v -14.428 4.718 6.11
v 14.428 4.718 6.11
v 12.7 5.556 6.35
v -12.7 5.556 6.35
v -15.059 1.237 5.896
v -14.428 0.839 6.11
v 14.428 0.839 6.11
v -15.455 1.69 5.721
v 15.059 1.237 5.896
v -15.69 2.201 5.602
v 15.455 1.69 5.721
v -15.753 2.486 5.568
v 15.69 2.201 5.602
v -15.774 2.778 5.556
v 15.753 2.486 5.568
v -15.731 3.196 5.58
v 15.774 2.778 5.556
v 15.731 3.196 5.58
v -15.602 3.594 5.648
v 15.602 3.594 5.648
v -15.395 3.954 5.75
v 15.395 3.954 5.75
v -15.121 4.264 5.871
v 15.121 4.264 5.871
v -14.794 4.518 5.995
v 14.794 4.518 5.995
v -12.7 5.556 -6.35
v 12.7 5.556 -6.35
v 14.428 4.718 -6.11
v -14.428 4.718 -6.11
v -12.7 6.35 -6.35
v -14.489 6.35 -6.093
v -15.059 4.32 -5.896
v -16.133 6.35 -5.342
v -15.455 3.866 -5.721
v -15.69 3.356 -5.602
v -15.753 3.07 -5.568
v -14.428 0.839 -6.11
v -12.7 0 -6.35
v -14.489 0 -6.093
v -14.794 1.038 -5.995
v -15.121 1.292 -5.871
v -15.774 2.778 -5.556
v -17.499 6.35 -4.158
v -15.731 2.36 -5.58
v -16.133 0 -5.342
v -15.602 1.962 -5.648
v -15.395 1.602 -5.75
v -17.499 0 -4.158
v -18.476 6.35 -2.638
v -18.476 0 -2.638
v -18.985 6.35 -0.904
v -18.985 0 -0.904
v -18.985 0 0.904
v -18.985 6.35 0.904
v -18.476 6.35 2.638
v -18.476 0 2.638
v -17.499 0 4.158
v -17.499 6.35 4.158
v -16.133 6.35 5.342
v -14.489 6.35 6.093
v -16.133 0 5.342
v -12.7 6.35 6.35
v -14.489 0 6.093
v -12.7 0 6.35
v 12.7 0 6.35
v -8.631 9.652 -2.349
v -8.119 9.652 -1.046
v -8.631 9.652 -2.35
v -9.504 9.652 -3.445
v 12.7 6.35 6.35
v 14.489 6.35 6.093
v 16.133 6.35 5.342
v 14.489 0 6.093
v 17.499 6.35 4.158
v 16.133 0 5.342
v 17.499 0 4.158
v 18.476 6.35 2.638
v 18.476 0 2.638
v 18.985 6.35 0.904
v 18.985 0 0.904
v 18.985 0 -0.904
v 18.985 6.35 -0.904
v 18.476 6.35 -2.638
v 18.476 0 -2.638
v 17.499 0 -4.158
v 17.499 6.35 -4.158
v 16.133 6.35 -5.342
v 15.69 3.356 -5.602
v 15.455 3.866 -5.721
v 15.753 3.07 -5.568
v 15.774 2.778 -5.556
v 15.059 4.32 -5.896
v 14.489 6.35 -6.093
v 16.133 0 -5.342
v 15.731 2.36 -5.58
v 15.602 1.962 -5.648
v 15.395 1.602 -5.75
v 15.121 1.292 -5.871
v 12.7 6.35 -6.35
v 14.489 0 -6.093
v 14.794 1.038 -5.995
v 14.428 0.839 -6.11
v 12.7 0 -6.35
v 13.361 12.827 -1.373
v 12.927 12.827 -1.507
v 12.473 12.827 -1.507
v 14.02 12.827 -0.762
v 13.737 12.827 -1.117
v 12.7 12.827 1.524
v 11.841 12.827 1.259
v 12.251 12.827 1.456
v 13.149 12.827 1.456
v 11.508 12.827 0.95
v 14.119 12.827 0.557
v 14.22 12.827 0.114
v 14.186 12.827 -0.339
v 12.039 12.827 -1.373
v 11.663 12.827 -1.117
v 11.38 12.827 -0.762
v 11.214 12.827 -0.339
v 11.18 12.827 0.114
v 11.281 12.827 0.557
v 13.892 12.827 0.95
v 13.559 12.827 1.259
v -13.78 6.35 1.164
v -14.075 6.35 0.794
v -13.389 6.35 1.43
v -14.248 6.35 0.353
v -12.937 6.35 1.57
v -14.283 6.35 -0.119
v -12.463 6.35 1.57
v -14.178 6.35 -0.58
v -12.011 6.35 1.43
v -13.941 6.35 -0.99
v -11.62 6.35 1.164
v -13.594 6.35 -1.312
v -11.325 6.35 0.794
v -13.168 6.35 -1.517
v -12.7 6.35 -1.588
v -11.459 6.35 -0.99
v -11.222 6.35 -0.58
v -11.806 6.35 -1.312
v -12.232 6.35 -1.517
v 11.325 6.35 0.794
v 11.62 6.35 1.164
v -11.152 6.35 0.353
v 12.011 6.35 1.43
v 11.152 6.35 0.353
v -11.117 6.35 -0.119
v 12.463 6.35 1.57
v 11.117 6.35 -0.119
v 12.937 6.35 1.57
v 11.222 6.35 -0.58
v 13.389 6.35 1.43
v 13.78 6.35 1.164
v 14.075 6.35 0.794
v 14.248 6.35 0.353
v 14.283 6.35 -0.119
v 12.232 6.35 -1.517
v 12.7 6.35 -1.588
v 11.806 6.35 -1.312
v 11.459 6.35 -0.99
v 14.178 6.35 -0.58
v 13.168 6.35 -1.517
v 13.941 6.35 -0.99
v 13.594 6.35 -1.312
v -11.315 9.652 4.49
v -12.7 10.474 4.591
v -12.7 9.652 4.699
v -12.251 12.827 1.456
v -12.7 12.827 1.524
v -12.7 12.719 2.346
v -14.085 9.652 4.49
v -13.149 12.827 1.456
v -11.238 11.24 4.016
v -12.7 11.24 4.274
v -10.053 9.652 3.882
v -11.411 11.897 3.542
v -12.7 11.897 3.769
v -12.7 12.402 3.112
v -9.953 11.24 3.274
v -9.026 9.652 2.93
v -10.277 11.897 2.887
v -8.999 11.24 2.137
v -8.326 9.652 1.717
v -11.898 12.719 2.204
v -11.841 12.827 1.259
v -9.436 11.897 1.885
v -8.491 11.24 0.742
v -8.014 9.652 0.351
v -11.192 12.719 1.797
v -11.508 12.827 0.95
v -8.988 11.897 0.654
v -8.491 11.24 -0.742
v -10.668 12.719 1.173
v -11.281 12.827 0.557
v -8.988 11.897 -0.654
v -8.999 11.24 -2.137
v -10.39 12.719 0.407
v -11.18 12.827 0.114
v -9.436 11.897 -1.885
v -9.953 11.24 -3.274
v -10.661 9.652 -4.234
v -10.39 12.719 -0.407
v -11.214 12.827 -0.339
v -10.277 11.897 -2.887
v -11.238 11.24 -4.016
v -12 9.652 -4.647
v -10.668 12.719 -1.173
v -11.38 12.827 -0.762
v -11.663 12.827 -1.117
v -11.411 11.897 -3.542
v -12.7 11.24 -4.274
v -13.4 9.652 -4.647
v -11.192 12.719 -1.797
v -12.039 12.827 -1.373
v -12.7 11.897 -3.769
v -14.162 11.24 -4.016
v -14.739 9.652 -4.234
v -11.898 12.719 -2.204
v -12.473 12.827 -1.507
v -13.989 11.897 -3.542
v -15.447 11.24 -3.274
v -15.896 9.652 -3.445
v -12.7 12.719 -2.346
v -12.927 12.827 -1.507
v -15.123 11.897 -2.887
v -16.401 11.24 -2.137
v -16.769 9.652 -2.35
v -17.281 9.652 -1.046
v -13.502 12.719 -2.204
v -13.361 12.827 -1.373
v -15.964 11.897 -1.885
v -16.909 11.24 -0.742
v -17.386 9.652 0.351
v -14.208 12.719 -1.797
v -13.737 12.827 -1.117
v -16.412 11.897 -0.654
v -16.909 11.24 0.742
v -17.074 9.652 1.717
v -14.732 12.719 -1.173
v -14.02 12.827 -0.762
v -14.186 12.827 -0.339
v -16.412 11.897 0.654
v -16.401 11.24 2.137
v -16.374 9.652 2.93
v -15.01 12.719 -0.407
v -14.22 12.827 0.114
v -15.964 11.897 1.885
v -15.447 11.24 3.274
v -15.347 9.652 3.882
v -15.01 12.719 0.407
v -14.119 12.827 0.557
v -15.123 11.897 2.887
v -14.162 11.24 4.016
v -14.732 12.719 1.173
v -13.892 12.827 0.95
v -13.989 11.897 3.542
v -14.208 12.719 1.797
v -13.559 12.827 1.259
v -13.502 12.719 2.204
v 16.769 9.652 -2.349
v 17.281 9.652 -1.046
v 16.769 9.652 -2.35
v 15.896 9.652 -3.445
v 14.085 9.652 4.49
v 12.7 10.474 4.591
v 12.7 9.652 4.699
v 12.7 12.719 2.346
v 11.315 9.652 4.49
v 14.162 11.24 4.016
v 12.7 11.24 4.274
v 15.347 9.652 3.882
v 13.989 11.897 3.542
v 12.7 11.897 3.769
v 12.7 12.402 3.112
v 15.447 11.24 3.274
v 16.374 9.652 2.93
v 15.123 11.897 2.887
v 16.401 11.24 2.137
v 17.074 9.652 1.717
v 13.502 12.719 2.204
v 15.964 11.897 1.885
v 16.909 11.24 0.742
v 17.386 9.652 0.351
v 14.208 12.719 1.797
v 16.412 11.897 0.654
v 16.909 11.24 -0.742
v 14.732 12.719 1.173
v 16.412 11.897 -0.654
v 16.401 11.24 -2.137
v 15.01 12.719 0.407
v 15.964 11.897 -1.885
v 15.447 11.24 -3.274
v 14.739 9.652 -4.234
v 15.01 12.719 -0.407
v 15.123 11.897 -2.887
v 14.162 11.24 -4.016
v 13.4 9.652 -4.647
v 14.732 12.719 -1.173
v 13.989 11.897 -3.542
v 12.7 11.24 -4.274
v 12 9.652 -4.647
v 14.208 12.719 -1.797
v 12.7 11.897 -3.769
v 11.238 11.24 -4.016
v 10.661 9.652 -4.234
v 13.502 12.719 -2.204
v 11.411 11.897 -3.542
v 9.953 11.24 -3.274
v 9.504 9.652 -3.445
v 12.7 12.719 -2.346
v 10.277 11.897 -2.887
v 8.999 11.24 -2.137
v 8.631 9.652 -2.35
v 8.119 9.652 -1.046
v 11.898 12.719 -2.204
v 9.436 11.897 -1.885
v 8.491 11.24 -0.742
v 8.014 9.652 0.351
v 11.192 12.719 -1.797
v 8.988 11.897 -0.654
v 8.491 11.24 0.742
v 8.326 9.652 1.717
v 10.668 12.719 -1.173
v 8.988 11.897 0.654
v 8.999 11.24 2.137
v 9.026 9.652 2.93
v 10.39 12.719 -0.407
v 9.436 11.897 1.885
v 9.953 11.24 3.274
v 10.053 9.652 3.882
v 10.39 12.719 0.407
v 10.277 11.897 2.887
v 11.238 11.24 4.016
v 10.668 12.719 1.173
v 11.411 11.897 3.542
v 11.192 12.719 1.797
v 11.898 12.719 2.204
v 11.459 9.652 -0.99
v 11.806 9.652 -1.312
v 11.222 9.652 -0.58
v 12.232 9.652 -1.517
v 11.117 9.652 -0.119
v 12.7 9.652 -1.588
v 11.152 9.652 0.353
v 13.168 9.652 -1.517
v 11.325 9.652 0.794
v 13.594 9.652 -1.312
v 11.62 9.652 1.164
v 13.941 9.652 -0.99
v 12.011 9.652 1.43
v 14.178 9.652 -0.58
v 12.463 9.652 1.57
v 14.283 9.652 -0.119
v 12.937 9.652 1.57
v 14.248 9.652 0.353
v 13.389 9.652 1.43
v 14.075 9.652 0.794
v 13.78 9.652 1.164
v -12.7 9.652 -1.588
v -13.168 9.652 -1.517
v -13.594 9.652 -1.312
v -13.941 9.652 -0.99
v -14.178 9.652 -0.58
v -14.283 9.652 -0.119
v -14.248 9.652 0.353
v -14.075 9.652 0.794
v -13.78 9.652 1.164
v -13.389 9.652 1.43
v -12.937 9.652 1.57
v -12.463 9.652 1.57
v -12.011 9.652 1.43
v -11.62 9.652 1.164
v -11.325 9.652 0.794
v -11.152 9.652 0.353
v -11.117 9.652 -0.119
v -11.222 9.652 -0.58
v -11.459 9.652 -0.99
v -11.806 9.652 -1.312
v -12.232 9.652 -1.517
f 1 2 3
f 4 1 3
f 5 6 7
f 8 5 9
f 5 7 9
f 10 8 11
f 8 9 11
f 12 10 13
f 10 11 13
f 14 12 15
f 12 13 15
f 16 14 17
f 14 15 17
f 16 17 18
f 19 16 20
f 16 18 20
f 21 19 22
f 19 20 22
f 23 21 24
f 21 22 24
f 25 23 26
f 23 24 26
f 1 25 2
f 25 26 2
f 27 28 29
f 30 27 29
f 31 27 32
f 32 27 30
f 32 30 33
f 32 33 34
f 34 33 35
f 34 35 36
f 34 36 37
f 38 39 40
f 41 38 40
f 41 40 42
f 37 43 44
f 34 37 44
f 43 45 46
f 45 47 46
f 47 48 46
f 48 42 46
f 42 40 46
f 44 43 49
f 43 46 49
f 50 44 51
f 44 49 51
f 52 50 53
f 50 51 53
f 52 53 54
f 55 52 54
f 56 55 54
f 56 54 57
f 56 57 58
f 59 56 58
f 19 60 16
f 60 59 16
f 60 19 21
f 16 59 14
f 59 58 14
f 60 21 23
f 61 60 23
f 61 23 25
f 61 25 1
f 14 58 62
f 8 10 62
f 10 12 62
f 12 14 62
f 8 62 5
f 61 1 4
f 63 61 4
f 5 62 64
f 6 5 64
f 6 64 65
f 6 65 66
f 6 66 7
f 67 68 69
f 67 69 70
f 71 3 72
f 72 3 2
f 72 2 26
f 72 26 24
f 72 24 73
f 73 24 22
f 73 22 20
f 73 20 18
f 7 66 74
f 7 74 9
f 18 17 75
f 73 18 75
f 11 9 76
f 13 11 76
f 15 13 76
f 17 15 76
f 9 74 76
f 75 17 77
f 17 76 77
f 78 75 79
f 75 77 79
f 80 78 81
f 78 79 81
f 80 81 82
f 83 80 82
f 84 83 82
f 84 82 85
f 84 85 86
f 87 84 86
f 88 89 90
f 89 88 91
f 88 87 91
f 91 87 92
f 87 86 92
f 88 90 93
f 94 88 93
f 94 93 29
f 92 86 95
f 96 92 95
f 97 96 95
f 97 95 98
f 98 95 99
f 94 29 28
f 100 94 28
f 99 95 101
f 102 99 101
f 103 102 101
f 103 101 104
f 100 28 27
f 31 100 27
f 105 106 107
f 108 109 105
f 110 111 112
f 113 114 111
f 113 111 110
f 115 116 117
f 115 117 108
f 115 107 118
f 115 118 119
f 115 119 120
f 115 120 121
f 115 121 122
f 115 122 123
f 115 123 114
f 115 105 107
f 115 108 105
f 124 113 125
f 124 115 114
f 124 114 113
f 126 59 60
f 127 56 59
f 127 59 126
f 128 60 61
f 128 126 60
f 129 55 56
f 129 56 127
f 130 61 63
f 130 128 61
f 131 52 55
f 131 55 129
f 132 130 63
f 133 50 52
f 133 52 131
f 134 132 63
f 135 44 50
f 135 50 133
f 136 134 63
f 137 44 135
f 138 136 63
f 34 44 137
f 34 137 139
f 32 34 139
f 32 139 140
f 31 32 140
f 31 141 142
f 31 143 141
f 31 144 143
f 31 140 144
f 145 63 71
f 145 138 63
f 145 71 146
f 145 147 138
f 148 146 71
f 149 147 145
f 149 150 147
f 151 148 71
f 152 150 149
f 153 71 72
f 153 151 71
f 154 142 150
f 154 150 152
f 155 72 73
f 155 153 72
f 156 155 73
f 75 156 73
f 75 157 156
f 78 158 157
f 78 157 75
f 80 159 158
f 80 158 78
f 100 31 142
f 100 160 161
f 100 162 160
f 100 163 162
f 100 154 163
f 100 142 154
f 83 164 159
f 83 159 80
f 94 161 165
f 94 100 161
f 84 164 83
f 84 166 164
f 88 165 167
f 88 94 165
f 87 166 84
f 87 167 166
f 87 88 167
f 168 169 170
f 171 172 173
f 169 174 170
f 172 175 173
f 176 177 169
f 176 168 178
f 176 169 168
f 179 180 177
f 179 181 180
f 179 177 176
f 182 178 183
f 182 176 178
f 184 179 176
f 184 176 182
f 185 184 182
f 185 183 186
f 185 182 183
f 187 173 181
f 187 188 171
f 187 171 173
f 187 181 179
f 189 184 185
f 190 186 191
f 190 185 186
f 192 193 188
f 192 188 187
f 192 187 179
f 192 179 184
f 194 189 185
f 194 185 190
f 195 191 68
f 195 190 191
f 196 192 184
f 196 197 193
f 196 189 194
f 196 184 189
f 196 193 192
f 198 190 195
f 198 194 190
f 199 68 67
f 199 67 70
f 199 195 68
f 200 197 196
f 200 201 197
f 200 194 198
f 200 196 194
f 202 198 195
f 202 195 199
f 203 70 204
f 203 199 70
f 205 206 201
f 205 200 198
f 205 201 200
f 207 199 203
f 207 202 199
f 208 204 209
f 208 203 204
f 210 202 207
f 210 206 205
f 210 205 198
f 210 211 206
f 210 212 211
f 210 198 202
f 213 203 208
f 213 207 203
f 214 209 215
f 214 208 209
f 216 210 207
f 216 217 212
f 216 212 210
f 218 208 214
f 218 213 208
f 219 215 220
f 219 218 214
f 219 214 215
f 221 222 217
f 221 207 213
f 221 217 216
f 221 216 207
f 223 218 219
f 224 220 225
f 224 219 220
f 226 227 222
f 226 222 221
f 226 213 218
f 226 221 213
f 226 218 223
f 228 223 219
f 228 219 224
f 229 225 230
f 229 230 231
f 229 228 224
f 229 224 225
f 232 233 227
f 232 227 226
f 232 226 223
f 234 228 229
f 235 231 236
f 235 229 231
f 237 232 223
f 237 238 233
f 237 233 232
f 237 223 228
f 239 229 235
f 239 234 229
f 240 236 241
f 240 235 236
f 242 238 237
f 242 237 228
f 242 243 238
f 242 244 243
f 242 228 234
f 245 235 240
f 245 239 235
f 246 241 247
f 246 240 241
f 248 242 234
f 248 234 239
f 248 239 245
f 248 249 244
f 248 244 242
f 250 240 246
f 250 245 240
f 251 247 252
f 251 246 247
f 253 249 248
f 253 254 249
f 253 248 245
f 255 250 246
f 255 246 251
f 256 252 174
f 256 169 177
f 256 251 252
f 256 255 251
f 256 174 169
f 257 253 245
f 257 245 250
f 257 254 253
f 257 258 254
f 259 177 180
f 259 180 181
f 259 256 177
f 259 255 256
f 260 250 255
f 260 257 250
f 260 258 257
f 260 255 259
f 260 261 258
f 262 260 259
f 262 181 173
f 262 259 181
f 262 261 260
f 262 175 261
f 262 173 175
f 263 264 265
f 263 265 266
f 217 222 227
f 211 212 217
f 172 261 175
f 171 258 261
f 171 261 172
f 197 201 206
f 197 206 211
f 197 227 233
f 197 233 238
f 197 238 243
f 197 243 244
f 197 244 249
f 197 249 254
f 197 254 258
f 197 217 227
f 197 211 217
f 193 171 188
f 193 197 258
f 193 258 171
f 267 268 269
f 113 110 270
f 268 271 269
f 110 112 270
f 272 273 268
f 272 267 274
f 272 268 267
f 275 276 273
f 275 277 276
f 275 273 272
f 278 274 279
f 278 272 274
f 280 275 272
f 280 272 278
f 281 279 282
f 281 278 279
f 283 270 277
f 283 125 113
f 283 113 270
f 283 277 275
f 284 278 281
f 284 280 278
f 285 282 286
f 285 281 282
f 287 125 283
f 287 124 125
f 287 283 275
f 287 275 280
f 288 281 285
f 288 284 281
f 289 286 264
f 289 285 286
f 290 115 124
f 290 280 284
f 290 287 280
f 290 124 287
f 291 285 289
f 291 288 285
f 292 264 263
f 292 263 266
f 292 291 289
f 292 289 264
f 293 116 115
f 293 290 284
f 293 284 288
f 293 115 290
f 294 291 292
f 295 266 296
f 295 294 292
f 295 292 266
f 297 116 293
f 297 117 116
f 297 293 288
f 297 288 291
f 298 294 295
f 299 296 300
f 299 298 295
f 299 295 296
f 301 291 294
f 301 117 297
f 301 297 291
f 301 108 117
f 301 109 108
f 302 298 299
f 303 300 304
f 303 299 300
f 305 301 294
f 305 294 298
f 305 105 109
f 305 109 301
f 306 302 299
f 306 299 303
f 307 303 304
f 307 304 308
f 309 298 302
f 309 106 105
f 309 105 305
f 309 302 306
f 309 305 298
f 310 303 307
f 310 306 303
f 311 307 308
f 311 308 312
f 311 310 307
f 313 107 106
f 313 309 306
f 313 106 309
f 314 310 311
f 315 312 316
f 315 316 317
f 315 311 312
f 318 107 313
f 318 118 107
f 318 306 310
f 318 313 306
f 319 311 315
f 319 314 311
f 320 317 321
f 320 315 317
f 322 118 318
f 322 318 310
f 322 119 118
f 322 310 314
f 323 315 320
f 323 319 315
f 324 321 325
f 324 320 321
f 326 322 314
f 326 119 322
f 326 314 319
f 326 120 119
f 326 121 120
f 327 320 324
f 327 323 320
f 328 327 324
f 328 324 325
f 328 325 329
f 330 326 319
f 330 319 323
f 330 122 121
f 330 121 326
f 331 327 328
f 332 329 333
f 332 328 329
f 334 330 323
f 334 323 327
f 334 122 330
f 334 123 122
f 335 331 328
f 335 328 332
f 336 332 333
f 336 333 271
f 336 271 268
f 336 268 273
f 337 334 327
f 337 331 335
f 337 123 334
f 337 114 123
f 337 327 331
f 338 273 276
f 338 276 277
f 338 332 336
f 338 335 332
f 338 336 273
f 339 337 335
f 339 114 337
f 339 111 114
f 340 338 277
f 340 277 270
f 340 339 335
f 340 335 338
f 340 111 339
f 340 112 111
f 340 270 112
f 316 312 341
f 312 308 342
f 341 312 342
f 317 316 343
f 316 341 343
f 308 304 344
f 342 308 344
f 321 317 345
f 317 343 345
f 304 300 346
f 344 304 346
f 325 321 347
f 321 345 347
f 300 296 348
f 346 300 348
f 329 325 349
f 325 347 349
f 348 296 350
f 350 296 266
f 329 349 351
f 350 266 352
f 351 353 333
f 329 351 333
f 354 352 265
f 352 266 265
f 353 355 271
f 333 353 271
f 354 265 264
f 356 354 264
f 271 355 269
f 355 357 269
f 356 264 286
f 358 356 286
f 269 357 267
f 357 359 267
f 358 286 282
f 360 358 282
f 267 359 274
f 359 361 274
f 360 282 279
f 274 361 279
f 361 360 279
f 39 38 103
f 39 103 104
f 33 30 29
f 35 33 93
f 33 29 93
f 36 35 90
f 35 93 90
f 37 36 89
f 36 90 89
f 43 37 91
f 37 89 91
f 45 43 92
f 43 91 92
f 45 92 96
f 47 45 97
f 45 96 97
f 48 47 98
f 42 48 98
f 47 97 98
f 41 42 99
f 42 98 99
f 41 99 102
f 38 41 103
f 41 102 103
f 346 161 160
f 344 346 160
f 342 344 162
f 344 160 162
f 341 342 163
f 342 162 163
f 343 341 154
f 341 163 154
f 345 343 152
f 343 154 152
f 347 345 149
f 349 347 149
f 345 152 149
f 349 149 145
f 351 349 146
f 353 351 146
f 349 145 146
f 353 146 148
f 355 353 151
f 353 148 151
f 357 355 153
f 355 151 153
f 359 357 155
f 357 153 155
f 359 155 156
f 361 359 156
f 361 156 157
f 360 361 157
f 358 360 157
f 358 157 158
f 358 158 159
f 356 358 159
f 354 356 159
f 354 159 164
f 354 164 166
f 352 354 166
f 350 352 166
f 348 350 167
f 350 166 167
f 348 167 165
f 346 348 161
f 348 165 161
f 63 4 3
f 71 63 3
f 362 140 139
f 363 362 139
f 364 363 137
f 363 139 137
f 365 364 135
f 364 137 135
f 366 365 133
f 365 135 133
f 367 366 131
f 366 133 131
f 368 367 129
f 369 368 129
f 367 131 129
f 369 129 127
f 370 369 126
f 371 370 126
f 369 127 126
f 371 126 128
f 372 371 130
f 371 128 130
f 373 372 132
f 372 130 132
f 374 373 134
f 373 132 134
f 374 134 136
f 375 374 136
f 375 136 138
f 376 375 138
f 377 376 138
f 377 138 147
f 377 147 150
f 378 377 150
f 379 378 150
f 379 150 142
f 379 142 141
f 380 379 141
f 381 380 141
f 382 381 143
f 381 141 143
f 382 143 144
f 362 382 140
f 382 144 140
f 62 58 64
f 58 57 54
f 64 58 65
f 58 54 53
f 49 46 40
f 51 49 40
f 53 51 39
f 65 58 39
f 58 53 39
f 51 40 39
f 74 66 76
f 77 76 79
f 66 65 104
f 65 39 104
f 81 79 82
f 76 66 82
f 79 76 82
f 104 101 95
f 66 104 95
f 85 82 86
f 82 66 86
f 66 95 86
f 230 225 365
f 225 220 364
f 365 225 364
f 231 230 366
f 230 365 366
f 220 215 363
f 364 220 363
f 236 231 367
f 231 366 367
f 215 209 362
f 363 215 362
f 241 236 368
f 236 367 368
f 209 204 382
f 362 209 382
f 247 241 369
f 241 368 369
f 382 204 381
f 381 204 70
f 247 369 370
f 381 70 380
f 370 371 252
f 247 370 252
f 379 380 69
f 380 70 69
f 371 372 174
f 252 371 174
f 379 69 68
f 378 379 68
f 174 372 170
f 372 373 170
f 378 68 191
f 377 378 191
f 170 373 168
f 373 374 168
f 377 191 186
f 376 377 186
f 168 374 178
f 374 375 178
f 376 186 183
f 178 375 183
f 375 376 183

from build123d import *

# Parameters (mm, degrees)
SKETCH1_R           = 1.5875
BOSS_EXTRUDE1_DEPTH = 6.35
BOSS_EXTRUDE2_START = 6.35
SKETCH1_4_R         = 1.5875
BOSS_EXTRUDE2_DEPTH = 3.302
SKETCH2_R           = 4.699
BOSS_EXTRUDE3_DEPTH = 3.175
CUT_EXTRUDE1_DEPTH  = 20.32
FILLET1_R           = 3.175


with BuildPart() as part:
    # Sketch1 → Boss-Extrude1 (new body)
    # profile 1 of 3: a face of its own
    with BuildSketch(Plane(origin=(0, 0, 0), x_dir=(1, 0, 0), z_dir=(0, 1, 0))):
        with BuildLine():
            Line((-12.7, -6.35), (12.7, -6.35))
            ThreePointArc((12.7, -6.35), (19.05, 0), (12.7, 6.35))
            Line((12.7, 6.35), (-12.7, 6.35))
            ThreePointArc((-12.7, 6.35), (-19.05, 0), (-12.7, -6.35))
        make_face()
        with Locations((-12.7, 0)):
            Circle(SKETCH1_R, mode=Mode.SUBTRACT)
        with Locations((12.7, 0)):
            Circle(SKETCH1_R, mode=Mode.SUBTRACT)
    # profile 2 of 3: a face of its own
    with BuildSketch(Plane(origin=(0, 0, 0), x_dir=(1, 0, 0), z_dir=(0, 1, 0))):
        with Locations((-12.7, 0)):
            Circle(SKETCH1_R)
    # profile 3 of 3: a face of its own
    with BuildSketch(Plane(origin=(0, 0, 0), x_dir=(1, 0, 0), z_dir=(0, 1, 0))):
        with Locations((12.7, 0)):
            Circle(SKETCH1_R)
    extrude(amount=BOSS_EXTRUDE1_DEPTH)

    # Sketch1<4> → Boss-Extrude2 (add)
    with BuildSketch(Plane(origin=(0, 0, 0), x_dir=(1, 0, 0), z_dir=(0, 1, 0)).offset(BOSS_EXTRUDE2_START)):
        with Locations(Location((-12.7, 0, 0), (0, 0, 90))):
            Circle(SKETCH1_4_R)
        with Locations(Location((12.7, 0, 0), (0, 0, 90))):
            Circle(SKETCH1_4_R)
    extrude(amount=BOSS_EXTRUDE2_DEPTH)

    # Sketch2 → Boss-Extrude3 (add)
    with BuildSketch(Plane(origin=(0, 9.652, 0), x_dir=(1, 0, 0), z_dir=(0, 1, 0))):
        with Locations(Location((-12.7, 0, 0), (0, 0, 270))):
            Circle(SKETCH2_R)
        with Locations(Location((12.7, 0, 0), (0, 0, 270))):
            Circle(SKETCH2_R)
    extrude(amount=BOSS_EXTRUDE3_DEPTH)

    # Sketch3 → Cut-Extrude1 (cut, symmetric)
    with BuildSketch(Plane(origin=(0, 0, 0), x_dir=(0, 0, -1), z_dir=(1, 0, 0))):
        with BuildLine():
            Line((6.35, 0), (6.35, 5.55625))
            ThreePointArc((6.35, 5.55625), (6.288919267, 5.120130209), (6.110377358, 4.717570755))
            ThreePointArc((6.110377358, 4.717570755), (5.697499195, 3.786652016), (5.55625, 2.778125))
            ThreePointArc((5.55625, 2.778125), (5.697499195, 1.769597984), (6.110377358, 0.838679245))
            ThreePointArc((6.110377358, 0.838679245), (6.288919267, 0.436119791), (6.35, 0))
        make_face()
        with BuildLine():
            ThreePointArc((-6.110377358, 4.717570755), (-6.288919267, 5.120130209), (-6.35, 5.55625))
            Line((-6.35, 5.55625), (-6.35, 0))
            ThreePointArc((-6.35, 0), (-6.288919267, 0.436119791), (-6.110377358, 0.838679245))
            ThreePointArc((-6.110377358, 0.838679245), (-5.697499195, 1.769597984), (-5.55625, 2.778125))
            ThreePointArc((-5.55625, 2.778125), (-5.697499195, 3.786652016), (-6.110377358, 4.717570755))
        make_face()
    extrude(amount=CUT_EXTRUDE1_DEPTH, both=True, mode=Mode.SUBTRACT)

    # Fillet1
    fillet1_edges = [part.edges().sort_by_distance(p)[0] for p in [
        (-12.7, 12.827, -4.699),
        (12.7, 12.827, -4.699),
    ]]
    fillet(fillet1_edges, radius=FILLET1_R - 0.0001)  # a hair under: the kernel refuses the full size


solid = part.part
